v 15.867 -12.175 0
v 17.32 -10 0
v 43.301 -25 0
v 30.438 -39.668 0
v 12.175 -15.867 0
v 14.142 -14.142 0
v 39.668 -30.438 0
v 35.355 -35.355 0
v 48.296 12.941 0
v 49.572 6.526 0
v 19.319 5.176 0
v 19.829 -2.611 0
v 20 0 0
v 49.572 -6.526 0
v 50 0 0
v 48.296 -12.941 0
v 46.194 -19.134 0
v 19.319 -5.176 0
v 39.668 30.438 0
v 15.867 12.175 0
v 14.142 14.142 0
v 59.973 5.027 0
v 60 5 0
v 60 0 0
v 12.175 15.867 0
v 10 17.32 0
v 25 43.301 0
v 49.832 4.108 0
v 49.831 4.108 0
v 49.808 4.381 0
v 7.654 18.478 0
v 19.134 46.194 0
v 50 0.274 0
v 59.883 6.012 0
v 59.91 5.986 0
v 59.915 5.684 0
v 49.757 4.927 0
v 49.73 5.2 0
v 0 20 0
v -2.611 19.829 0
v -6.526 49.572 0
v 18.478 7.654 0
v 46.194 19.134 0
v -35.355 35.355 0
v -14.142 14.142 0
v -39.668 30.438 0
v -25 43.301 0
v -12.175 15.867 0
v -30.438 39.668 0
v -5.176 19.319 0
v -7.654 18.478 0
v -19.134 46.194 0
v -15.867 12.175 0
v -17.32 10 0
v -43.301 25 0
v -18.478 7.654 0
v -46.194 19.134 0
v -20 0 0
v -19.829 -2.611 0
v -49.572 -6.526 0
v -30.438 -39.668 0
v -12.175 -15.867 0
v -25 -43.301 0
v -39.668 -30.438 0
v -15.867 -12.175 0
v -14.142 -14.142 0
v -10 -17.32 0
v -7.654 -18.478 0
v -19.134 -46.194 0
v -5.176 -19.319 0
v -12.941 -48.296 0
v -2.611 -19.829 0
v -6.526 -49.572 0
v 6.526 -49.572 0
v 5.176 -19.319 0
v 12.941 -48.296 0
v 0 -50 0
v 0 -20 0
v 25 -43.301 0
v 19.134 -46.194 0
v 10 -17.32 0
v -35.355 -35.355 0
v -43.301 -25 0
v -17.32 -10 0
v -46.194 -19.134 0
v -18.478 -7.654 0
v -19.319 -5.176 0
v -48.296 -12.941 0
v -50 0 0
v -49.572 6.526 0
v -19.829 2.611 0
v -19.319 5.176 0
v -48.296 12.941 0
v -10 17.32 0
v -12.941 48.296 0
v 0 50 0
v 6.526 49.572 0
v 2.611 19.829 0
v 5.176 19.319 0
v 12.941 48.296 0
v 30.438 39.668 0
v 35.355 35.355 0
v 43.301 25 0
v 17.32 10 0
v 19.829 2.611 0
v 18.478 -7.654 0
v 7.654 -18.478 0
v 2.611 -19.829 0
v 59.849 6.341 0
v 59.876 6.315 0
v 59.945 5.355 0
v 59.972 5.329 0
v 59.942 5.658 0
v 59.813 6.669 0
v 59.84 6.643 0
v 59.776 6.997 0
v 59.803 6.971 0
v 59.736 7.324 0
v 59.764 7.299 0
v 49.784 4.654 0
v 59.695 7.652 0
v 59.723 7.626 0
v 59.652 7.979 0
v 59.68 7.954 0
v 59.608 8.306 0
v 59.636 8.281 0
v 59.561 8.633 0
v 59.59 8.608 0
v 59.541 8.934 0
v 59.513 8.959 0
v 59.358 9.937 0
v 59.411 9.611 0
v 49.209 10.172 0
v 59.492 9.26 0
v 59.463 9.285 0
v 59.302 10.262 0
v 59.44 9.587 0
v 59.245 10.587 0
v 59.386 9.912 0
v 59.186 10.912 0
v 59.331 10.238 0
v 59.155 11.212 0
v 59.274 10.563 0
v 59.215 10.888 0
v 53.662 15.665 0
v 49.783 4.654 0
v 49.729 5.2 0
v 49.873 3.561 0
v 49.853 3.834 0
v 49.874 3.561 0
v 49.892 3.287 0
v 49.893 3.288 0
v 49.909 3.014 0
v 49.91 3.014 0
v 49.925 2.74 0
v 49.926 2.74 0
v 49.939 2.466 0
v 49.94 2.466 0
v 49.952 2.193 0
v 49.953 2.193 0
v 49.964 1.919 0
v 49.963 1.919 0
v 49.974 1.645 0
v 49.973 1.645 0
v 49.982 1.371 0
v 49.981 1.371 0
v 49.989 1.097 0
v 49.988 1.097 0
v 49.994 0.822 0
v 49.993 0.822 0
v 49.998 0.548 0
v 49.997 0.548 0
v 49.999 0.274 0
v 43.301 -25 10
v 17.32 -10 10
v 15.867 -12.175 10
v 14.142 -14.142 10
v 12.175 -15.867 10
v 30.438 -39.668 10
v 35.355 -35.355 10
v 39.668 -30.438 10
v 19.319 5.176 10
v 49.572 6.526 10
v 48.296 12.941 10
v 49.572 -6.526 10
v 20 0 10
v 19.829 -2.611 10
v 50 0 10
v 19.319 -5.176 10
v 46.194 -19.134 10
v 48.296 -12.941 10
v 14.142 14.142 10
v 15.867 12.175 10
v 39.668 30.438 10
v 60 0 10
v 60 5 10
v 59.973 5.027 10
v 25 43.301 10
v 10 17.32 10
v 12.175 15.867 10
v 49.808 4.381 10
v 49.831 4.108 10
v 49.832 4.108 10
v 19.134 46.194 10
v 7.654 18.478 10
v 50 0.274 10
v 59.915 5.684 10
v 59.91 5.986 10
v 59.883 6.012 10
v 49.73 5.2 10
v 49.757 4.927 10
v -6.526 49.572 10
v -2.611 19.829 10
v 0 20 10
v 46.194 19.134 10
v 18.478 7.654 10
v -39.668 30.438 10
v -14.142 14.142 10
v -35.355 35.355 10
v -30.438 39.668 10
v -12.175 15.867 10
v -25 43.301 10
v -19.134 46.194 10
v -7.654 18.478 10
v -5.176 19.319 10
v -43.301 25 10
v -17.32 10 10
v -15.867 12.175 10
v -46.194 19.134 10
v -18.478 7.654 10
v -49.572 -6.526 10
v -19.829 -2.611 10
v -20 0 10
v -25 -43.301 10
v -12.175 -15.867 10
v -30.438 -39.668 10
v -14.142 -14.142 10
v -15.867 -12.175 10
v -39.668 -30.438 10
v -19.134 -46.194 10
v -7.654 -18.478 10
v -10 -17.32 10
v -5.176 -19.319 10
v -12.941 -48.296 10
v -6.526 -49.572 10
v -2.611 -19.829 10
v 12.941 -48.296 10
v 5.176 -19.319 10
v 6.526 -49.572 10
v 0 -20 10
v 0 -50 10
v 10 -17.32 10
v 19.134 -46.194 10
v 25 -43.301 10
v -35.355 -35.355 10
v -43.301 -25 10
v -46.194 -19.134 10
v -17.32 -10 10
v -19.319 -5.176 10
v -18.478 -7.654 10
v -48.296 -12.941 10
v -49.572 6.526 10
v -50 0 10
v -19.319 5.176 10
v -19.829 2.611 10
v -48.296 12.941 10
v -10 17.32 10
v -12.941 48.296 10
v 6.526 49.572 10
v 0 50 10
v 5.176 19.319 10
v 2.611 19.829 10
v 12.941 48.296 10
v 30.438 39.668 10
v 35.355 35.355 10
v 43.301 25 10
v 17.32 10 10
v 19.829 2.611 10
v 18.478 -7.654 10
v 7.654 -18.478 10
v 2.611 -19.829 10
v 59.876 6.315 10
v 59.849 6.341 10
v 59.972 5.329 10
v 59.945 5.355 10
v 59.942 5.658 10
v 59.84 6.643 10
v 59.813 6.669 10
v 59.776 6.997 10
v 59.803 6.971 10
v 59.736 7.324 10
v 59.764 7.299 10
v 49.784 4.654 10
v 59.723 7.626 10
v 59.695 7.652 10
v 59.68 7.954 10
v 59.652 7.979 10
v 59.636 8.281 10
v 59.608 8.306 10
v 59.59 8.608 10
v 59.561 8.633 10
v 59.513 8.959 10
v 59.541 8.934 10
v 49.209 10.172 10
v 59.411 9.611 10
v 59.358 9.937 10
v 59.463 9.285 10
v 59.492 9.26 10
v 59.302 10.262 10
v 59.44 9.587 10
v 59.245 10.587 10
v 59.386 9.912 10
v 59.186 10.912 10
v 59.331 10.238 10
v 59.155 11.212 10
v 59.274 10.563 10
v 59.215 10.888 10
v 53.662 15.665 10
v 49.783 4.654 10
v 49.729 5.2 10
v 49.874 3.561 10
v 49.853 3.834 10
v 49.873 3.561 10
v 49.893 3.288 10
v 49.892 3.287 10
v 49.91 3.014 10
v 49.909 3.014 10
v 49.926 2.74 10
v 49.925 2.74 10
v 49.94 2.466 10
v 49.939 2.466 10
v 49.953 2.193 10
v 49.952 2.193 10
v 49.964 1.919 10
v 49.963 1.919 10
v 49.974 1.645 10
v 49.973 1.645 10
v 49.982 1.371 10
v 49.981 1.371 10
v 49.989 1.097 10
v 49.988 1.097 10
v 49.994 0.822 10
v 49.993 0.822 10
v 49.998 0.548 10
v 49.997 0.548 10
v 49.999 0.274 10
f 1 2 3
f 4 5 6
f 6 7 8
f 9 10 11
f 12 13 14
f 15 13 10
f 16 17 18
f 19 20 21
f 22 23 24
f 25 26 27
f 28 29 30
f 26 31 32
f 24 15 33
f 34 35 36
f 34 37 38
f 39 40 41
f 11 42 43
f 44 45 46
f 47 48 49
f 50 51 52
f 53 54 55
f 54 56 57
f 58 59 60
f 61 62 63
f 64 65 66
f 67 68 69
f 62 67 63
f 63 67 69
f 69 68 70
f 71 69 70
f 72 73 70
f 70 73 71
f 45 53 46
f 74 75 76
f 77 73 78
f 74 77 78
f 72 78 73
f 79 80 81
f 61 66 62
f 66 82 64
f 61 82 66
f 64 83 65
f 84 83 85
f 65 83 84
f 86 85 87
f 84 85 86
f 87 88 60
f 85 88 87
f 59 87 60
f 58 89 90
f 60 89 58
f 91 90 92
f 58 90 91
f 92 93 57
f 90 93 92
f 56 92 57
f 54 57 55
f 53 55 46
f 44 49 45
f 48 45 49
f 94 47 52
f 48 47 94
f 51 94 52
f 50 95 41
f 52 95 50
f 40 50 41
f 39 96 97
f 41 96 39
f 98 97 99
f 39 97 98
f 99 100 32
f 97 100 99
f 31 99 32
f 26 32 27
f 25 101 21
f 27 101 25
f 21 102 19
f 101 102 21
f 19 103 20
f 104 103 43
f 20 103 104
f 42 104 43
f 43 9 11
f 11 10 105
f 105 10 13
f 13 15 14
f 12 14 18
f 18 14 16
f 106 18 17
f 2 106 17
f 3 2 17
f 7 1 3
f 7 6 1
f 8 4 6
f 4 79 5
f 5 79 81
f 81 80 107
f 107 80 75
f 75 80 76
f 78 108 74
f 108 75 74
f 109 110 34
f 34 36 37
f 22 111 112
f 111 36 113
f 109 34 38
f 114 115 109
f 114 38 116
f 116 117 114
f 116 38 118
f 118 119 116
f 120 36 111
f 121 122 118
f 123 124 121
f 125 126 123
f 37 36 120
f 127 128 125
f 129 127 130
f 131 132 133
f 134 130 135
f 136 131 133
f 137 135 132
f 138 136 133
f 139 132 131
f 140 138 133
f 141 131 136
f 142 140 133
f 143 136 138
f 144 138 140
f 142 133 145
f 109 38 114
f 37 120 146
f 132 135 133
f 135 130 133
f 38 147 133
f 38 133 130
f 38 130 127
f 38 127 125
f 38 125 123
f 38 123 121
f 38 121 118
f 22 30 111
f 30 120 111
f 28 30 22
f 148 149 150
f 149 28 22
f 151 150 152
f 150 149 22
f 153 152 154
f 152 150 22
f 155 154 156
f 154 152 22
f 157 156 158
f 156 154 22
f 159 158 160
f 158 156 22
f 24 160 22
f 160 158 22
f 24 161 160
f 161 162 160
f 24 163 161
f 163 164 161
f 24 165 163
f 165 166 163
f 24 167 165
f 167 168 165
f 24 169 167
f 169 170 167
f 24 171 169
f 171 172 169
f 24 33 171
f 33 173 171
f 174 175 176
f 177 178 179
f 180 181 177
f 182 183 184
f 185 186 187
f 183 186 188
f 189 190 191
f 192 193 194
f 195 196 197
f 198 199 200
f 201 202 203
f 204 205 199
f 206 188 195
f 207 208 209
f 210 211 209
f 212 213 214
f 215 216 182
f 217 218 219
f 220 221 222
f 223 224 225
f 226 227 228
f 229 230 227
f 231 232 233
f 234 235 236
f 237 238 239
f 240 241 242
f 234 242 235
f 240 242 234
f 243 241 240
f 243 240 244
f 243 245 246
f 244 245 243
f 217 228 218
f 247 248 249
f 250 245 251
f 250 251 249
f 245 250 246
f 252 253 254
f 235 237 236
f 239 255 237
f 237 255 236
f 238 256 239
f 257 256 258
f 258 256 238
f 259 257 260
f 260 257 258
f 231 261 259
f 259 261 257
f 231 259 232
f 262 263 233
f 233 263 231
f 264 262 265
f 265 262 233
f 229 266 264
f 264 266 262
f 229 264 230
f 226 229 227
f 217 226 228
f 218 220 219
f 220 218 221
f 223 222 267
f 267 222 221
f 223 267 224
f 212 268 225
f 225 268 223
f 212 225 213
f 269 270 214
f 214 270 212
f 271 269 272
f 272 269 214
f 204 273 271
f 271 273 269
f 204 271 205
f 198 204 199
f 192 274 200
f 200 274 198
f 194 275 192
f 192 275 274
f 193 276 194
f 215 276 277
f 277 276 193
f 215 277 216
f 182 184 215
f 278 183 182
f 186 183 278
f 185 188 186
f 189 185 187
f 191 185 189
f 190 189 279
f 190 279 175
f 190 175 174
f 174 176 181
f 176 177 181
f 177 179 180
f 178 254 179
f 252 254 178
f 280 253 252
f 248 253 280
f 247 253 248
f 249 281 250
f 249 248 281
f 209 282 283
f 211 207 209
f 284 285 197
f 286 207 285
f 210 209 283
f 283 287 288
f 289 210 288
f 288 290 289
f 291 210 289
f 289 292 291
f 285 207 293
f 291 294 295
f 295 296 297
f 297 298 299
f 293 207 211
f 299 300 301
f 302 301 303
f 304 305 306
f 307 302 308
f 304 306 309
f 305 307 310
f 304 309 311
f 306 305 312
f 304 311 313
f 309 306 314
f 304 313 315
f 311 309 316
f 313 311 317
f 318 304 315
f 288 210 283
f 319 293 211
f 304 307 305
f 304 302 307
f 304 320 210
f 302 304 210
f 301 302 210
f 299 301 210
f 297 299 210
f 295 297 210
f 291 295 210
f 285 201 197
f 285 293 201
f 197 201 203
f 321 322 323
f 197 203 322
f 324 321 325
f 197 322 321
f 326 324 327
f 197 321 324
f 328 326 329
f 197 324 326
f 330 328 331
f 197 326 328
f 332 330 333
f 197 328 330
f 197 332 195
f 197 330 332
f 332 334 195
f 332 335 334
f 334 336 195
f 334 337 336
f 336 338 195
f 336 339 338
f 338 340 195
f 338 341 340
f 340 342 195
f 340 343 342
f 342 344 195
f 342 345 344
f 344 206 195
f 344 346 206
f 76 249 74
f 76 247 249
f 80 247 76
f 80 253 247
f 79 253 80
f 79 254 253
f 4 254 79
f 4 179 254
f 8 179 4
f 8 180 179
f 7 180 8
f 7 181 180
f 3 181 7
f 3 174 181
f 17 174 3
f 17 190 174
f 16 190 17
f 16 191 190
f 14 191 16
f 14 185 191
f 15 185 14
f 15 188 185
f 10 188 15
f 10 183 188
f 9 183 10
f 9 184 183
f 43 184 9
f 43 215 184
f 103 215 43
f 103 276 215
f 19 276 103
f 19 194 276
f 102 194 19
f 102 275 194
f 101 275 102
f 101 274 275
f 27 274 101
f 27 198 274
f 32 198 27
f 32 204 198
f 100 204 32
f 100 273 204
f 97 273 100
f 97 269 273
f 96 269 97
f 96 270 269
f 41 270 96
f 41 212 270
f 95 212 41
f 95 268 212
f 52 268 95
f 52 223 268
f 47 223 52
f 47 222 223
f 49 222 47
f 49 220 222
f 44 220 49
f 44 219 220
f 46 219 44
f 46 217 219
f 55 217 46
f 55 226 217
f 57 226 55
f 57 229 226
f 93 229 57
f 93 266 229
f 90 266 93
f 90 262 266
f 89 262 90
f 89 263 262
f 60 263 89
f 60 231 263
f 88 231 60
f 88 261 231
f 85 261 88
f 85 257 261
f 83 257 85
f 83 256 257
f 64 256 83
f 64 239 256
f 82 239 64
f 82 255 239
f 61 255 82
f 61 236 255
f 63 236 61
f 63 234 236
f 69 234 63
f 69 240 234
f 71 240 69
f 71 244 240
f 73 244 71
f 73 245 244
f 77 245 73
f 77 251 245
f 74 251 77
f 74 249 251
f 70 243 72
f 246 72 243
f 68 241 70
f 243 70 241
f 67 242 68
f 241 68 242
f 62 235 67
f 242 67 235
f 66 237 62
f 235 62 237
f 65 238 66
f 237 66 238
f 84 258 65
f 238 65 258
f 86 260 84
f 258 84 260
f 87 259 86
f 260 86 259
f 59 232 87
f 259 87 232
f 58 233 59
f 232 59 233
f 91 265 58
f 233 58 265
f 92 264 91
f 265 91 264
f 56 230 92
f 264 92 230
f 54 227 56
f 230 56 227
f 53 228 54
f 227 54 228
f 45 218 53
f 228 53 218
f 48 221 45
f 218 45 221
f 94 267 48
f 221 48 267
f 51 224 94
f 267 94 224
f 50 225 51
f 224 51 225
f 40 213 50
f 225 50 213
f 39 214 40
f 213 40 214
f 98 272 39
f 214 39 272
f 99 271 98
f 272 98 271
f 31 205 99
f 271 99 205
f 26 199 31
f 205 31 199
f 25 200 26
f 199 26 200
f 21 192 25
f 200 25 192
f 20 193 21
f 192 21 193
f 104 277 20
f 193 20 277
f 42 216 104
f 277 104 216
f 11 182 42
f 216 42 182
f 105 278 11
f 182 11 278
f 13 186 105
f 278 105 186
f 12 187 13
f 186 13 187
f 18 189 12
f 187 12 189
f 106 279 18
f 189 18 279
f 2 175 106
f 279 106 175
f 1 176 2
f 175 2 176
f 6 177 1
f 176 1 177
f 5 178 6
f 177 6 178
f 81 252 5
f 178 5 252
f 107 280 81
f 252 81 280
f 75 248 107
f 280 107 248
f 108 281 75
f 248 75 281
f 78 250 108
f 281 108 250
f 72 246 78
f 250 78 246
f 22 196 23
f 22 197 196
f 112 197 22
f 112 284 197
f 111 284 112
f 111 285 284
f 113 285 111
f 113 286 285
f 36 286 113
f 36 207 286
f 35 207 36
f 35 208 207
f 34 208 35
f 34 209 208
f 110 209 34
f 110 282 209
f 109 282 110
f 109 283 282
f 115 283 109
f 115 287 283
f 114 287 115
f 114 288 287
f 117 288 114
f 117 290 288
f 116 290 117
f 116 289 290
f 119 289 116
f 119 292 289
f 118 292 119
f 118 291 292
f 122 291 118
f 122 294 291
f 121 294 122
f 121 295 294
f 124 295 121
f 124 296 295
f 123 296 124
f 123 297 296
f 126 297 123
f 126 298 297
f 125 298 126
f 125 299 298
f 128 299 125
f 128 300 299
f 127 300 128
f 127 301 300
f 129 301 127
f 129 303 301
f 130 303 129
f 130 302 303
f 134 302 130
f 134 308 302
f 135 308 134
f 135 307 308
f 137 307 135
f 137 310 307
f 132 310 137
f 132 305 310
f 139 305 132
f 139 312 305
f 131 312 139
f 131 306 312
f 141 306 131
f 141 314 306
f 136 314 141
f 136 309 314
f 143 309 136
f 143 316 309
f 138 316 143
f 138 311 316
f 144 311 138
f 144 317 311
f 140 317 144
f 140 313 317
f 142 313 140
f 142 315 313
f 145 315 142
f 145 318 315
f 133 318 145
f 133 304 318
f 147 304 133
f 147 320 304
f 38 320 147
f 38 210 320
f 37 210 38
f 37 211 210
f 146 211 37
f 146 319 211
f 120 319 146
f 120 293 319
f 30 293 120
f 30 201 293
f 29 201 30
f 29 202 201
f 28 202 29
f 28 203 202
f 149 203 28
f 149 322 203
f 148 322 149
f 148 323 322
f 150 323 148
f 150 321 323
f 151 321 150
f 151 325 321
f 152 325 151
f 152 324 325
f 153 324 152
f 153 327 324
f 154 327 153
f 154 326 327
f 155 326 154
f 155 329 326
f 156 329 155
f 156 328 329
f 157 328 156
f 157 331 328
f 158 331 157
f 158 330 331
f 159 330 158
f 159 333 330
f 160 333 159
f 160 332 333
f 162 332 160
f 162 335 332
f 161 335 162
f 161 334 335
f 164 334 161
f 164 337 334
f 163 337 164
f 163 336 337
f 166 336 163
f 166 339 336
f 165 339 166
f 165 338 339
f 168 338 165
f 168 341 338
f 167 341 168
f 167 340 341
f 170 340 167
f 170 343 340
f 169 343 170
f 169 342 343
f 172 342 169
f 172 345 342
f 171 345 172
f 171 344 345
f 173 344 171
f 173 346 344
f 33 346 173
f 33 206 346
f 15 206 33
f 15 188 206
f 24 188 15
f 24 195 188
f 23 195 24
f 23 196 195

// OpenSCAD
$fn = 48;


linear_extrude(height = 10) {
	union() {
		difference() {
			circle(r = 50);
			circle(r = 20);
		}
		rotate(a = [0, 0, 0.0000000000]) {
			translate(v = [50, 0, 0]) {
				polygon(points = [[0, 0], [10, 0], [10, 5.0000000000], [5.0000000000, 10], [0, 5.0000000000]]);
			}
		}
		rotate(a = [0, 0, 0.3141592654]) {
			translate(v = [50, 0, 0]) {
				polygon(points = [[0, 0], [10, 0], [10, 5.0000000000], [5.0000000000, 10], [0, 5.0000000000]]);
			}
		}
		rotate(a = [0, 0, 0.6283185307]) {
			translate(v = [50, 0, 0]) {
				polygon(points = [[0, 0], [10, 0], [10, 5.0000000000], [5.0000000000, 10], [0, 5.0000000000]]);
			}
		}
		rotate(a = [0, 0, 0.9424777961]) {
			translate(v = [50, 0, 0]) {
				polygon(points = [[0, 0], [10, 0], [10, 5.0000000000], [5.0000000000, 10], [0, 5.0000000000]]);
			}
		}
		rotate(a = [0, 0, 1.2566370614]) {
			translate(v = [50, 0, 0]) {
				polygon(points = [[0, 0], [10, 0], [10, 5.0000000000], [5.0000000000, 10], [0, 5.0000000000]]);
			}
		}
		rotate(a = [0, 0, 1.5707963268]) {
			translate(v = [50, 0, 0]) {
				polygon(points = [[0, 0], [10, 0], [10, 5.0000000000], [5.0000000000, 10], [0, 5.0000000000]]);
			}
		}
		rotate(a = [0, 0, 1.8849555922]) {
			translate(v = [50, 0, 0]) {
				polygon(points = [[0, 0], [10, 0], [10, 5.0000000000], [5.0000000000, 10], [0, 5.0000000000]]);
			}
		}
		rotate(a = [0, 0, 2.1991148575]) {
			translate(v = [50, 0, 0]) {
				polygon(points = [[0, 0], [10, 0], [10, 5.0000000000], [5.0000000000, 10], [0, 5.0000000000]]);
			}
		}
		rotate(a = [0, 0, 2.5132741229]) {
			translate(v = [50, 0, 0]) {
				polygon(points = [[0, 0], [10, 0], [10, 5.0000000000], [5.0000000000, 10], [0, 5.0000000000]]);
			}
		}
		rotate(a = [0, 0, 2.8274333882]) {
			translate(v = [50, 0, 0]) {
				polygon(points = [[0, 0], [10, 0], [10, 5.0000000000], [5.0000000000, 10], [0, 5.0000000000]]);
			}
		}
		rotate(a = [0, 0, 3.1415926536]) {
			translate(v = [50, 0, 0]) {
				polygon(points = [[0, 0], [10, 0], [10, 5.0000000000], [5.0000000000, 10], [0, 5.0000000000]]);
			}
		}
		rotate(a = [0, 0, 3.4557519189]) {
			translate(v = [50, 0, 0]) {
				polygon(points = [[0, 0], [10, 0], [10, 5.0000000000], [5.0000000000, 10], [0, 5.0000000000]]);
			}
		}
		rotate(a = [0, 0, 3.7699111843]) {
			translate(v = [50, 0, 0]) {
				polygon(points = [[0, 0], [10, 0], [10, 5.0000000000], [5.0000000000, 10], [0, 5.0000000000]]);
			}
		}
		rotate(a = [0, 0, 4.0840704497]) {
			translate(v = [50, 0, 0]) {
				polygon(points = [[0, 0], [10, 0], [10, 5.0000000000], [5.0000000000, 10], [0, 5.0000000000]]);
			}
		}
		rotate(a = [0, 0, 4.3982297150]) {
			translate(v = [50, 0, 0]) {
				polygon(points = [[0, 0], [10, 0], [10, 5.0000000000], [5.0000000000, 10], [0, 5.0000000000]]);
			}
		}
		rotate(a = [0, 0, 4.7123889804]) {
			translate(v = [50, 0, 0]) {
				polygon(points = [[0, 0], [10, 0], [10, 5.0000000000], [5.0000000000, 10], [0, 5.0000000000]]);
			}
		}
		rotate(a = [0, 0, 5.0265482457]) {
			translate(v = [50, 0, 0]) {
				polygon(points = [[0, 0], [10, 0], [10, 5.0000000000], [5.0000000000, 10], [0, 5.0000000000]]);
			}
		}
		rotate(a = [0, 0, 5.3407075111]) {
			translate(v = [50, 0, 0]) {
				polygon(points = [[0, 0], [10, 0], [10, 5.0000000000], [5.0000000000, 10], [0, 5.0000000000]]);
			}
		}
		rotate(a = [0, 0, 5.6548667765]) {
			translate(v = [50, 0, 0]) {
				polygon(points = [[0, 0], [10, 0], [10, 5.0000000000], [5.0000000000, 10], [0, 5.0000000000]]);
			}
		}
		rotate(a = [0, 0, 5.9690260418]) {
			translate(v = [50, 0, 0]) {
				polygon(points = [[0, 0], [10, 0], [10, 5.0000000000], [5.0000000000, 10], [0, 5.0000000000]]);
			}
		}
	}
}
